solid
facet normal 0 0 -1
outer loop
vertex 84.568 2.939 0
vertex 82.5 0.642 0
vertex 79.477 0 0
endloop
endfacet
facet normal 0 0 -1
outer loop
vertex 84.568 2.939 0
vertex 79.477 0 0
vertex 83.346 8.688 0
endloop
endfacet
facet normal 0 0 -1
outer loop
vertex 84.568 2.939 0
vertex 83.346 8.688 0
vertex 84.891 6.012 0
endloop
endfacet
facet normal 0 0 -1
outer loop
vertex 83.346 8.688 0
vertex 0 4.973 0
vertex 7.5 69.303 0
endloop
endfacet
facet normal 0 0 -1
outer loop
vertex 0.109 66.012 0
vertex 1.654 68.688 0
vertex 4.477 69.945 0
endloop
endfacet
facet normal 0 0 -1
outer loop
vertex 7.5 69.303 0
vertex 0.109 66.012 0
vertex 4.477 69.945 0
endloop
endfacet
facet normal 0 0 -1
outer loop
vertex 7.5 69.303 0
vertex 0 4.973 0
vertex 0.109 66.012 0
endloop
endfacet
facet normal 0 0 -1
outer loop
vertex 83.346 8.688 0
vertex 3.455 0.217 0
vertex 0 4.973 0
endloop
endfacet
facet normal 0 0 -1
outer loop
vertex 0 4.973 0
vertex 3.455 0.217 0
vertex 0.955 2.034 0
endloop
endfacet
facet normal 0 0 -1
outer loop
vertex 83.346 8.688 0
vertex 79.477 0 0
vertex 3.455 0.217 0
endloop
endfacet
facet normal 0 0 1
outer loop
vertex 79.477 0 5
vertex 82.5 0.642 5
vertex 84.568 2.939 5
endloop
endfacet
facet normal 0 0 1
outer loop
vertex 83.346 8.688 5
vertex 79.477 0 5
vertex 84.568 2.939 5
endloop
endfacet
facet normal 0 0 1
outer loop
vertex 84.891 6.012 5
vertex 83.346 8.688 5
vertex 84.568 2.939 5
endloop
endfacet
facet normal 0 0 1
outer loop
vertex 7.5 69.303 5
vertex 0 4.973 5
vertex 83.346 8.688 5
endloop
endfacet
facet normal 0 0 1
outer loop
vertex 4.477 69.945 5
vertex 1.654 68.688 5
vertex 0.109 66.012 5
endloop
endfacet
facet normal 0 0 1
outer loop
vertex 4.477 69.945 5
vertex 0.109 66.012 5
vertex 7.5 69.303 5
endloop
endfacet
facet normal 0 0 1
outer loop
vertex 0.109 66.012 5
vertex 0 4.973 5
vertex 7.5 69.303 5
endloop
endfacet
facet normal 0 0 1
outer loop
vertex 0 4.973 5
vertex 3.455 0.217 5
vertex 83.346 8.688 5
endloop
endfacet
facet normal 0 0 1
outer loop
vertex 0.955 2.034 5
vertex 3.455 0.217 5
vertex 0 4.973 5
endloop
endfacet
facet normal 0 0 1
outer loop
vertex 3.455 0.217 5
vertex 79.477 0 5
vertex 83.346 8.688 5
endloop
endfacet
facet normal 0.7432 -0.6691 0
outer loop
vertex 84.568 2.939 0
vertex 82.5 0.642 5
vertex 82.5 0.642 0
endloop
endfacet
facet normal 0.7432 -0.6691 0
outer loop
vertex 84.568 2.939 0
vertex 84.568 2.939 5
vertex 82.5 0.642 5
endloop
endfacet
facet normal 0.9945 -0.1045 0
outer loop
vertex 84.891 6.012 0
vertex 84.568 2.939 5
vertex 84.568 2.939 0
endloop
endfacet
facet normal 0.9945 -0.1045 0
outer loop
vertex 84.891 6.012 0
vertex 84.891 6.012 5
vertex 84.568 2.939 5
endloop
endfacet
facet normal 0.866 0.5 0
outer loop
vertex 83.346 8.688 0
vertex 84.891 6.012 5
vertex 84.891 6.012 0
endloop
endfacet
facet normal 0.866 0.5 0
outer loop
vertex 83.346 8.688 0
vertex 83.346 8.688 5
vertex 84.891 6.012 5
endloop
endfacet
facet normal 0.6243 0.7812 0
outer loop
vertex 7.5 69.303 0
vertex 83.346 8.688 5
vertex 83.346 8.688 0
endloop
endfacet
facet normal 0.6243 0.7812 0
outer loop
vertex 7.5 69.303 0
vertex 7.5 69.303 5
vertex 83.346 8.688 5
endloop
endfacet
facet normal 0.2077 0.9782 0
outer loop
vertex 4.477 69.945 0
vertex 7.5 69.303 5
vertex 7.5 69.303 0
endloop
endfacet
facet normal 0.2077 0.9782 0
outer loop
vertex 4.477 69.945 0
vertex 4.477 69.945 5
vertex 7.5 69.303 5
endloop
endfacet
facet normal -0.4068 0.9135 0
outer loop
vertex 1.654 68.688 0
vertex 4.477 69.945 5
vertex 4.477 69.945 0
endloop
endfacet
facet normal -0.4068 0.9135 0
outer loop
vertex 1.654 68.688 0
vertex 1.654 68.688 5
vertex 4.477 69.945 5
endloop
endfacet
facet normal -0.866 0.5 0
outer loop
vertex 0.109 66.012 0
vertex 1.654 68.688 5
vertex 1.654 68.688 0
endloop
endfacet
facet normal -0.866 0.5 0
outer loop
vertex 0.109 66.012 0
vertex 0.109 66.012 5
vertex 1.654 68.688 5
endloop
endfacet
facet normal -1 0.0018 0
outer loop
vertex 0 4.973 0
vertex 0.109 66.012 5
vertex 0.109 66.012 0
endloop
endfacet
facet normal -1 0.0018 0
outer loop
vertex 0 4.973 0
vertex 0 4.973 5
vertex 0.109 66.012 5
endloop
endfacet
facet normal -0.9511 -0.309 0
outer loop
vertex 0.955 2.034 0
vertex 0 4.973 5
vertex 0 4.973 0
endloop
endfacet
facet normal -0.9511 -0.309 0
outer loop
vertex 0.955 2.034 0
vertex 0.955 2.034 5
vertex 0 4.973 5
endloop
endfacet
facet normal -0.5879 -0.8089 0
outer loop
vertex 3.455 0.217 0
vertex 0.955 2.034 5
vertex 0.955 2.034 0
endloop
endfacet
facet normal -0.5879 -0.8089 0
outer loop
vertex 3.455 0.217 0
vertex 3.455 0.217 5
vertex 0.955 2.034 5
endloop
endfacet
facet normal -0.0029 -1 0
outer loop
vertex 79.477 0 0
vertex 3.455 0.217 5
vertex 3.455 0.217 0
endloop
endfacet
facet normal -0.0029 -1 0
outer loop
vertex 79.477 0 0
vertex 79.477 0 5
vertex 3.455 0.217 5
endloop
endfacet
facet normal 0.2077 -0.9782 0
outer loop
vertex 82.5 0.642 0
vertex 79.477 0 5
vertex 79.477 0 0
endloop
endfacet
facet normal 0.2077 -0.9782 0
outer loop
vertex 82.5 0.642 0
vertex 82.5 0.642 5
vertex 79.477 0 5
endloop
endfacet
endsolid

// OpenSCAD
$fn = 32;

// ----------------------------------------------------------------------
// Lever arm: two bosses 10 and 10 mm, 75 mm between centres
// ----------------------------------------------------------------------

// --- parameters (mm) ---
profile_height = 5;       // extrusion height
profile_points = 12;      // points of the closed outline

profile = [[0, 4.973], [0.955, 2.034], [3.455, 0.217], [79.477, 0], [82.5, 0.642], [84.568, 2.939], [84.891, 6.012], [83.346, 8.688], [7.5, 69.303], [4.477, 69.945], [1.654, 68.688], [0.109, 66.012]];  // single closed polygon, 12 points, counter clockwise

// --- the one profile operation ---
linear_extrude(height = profile_height) polygon(points = profile);
